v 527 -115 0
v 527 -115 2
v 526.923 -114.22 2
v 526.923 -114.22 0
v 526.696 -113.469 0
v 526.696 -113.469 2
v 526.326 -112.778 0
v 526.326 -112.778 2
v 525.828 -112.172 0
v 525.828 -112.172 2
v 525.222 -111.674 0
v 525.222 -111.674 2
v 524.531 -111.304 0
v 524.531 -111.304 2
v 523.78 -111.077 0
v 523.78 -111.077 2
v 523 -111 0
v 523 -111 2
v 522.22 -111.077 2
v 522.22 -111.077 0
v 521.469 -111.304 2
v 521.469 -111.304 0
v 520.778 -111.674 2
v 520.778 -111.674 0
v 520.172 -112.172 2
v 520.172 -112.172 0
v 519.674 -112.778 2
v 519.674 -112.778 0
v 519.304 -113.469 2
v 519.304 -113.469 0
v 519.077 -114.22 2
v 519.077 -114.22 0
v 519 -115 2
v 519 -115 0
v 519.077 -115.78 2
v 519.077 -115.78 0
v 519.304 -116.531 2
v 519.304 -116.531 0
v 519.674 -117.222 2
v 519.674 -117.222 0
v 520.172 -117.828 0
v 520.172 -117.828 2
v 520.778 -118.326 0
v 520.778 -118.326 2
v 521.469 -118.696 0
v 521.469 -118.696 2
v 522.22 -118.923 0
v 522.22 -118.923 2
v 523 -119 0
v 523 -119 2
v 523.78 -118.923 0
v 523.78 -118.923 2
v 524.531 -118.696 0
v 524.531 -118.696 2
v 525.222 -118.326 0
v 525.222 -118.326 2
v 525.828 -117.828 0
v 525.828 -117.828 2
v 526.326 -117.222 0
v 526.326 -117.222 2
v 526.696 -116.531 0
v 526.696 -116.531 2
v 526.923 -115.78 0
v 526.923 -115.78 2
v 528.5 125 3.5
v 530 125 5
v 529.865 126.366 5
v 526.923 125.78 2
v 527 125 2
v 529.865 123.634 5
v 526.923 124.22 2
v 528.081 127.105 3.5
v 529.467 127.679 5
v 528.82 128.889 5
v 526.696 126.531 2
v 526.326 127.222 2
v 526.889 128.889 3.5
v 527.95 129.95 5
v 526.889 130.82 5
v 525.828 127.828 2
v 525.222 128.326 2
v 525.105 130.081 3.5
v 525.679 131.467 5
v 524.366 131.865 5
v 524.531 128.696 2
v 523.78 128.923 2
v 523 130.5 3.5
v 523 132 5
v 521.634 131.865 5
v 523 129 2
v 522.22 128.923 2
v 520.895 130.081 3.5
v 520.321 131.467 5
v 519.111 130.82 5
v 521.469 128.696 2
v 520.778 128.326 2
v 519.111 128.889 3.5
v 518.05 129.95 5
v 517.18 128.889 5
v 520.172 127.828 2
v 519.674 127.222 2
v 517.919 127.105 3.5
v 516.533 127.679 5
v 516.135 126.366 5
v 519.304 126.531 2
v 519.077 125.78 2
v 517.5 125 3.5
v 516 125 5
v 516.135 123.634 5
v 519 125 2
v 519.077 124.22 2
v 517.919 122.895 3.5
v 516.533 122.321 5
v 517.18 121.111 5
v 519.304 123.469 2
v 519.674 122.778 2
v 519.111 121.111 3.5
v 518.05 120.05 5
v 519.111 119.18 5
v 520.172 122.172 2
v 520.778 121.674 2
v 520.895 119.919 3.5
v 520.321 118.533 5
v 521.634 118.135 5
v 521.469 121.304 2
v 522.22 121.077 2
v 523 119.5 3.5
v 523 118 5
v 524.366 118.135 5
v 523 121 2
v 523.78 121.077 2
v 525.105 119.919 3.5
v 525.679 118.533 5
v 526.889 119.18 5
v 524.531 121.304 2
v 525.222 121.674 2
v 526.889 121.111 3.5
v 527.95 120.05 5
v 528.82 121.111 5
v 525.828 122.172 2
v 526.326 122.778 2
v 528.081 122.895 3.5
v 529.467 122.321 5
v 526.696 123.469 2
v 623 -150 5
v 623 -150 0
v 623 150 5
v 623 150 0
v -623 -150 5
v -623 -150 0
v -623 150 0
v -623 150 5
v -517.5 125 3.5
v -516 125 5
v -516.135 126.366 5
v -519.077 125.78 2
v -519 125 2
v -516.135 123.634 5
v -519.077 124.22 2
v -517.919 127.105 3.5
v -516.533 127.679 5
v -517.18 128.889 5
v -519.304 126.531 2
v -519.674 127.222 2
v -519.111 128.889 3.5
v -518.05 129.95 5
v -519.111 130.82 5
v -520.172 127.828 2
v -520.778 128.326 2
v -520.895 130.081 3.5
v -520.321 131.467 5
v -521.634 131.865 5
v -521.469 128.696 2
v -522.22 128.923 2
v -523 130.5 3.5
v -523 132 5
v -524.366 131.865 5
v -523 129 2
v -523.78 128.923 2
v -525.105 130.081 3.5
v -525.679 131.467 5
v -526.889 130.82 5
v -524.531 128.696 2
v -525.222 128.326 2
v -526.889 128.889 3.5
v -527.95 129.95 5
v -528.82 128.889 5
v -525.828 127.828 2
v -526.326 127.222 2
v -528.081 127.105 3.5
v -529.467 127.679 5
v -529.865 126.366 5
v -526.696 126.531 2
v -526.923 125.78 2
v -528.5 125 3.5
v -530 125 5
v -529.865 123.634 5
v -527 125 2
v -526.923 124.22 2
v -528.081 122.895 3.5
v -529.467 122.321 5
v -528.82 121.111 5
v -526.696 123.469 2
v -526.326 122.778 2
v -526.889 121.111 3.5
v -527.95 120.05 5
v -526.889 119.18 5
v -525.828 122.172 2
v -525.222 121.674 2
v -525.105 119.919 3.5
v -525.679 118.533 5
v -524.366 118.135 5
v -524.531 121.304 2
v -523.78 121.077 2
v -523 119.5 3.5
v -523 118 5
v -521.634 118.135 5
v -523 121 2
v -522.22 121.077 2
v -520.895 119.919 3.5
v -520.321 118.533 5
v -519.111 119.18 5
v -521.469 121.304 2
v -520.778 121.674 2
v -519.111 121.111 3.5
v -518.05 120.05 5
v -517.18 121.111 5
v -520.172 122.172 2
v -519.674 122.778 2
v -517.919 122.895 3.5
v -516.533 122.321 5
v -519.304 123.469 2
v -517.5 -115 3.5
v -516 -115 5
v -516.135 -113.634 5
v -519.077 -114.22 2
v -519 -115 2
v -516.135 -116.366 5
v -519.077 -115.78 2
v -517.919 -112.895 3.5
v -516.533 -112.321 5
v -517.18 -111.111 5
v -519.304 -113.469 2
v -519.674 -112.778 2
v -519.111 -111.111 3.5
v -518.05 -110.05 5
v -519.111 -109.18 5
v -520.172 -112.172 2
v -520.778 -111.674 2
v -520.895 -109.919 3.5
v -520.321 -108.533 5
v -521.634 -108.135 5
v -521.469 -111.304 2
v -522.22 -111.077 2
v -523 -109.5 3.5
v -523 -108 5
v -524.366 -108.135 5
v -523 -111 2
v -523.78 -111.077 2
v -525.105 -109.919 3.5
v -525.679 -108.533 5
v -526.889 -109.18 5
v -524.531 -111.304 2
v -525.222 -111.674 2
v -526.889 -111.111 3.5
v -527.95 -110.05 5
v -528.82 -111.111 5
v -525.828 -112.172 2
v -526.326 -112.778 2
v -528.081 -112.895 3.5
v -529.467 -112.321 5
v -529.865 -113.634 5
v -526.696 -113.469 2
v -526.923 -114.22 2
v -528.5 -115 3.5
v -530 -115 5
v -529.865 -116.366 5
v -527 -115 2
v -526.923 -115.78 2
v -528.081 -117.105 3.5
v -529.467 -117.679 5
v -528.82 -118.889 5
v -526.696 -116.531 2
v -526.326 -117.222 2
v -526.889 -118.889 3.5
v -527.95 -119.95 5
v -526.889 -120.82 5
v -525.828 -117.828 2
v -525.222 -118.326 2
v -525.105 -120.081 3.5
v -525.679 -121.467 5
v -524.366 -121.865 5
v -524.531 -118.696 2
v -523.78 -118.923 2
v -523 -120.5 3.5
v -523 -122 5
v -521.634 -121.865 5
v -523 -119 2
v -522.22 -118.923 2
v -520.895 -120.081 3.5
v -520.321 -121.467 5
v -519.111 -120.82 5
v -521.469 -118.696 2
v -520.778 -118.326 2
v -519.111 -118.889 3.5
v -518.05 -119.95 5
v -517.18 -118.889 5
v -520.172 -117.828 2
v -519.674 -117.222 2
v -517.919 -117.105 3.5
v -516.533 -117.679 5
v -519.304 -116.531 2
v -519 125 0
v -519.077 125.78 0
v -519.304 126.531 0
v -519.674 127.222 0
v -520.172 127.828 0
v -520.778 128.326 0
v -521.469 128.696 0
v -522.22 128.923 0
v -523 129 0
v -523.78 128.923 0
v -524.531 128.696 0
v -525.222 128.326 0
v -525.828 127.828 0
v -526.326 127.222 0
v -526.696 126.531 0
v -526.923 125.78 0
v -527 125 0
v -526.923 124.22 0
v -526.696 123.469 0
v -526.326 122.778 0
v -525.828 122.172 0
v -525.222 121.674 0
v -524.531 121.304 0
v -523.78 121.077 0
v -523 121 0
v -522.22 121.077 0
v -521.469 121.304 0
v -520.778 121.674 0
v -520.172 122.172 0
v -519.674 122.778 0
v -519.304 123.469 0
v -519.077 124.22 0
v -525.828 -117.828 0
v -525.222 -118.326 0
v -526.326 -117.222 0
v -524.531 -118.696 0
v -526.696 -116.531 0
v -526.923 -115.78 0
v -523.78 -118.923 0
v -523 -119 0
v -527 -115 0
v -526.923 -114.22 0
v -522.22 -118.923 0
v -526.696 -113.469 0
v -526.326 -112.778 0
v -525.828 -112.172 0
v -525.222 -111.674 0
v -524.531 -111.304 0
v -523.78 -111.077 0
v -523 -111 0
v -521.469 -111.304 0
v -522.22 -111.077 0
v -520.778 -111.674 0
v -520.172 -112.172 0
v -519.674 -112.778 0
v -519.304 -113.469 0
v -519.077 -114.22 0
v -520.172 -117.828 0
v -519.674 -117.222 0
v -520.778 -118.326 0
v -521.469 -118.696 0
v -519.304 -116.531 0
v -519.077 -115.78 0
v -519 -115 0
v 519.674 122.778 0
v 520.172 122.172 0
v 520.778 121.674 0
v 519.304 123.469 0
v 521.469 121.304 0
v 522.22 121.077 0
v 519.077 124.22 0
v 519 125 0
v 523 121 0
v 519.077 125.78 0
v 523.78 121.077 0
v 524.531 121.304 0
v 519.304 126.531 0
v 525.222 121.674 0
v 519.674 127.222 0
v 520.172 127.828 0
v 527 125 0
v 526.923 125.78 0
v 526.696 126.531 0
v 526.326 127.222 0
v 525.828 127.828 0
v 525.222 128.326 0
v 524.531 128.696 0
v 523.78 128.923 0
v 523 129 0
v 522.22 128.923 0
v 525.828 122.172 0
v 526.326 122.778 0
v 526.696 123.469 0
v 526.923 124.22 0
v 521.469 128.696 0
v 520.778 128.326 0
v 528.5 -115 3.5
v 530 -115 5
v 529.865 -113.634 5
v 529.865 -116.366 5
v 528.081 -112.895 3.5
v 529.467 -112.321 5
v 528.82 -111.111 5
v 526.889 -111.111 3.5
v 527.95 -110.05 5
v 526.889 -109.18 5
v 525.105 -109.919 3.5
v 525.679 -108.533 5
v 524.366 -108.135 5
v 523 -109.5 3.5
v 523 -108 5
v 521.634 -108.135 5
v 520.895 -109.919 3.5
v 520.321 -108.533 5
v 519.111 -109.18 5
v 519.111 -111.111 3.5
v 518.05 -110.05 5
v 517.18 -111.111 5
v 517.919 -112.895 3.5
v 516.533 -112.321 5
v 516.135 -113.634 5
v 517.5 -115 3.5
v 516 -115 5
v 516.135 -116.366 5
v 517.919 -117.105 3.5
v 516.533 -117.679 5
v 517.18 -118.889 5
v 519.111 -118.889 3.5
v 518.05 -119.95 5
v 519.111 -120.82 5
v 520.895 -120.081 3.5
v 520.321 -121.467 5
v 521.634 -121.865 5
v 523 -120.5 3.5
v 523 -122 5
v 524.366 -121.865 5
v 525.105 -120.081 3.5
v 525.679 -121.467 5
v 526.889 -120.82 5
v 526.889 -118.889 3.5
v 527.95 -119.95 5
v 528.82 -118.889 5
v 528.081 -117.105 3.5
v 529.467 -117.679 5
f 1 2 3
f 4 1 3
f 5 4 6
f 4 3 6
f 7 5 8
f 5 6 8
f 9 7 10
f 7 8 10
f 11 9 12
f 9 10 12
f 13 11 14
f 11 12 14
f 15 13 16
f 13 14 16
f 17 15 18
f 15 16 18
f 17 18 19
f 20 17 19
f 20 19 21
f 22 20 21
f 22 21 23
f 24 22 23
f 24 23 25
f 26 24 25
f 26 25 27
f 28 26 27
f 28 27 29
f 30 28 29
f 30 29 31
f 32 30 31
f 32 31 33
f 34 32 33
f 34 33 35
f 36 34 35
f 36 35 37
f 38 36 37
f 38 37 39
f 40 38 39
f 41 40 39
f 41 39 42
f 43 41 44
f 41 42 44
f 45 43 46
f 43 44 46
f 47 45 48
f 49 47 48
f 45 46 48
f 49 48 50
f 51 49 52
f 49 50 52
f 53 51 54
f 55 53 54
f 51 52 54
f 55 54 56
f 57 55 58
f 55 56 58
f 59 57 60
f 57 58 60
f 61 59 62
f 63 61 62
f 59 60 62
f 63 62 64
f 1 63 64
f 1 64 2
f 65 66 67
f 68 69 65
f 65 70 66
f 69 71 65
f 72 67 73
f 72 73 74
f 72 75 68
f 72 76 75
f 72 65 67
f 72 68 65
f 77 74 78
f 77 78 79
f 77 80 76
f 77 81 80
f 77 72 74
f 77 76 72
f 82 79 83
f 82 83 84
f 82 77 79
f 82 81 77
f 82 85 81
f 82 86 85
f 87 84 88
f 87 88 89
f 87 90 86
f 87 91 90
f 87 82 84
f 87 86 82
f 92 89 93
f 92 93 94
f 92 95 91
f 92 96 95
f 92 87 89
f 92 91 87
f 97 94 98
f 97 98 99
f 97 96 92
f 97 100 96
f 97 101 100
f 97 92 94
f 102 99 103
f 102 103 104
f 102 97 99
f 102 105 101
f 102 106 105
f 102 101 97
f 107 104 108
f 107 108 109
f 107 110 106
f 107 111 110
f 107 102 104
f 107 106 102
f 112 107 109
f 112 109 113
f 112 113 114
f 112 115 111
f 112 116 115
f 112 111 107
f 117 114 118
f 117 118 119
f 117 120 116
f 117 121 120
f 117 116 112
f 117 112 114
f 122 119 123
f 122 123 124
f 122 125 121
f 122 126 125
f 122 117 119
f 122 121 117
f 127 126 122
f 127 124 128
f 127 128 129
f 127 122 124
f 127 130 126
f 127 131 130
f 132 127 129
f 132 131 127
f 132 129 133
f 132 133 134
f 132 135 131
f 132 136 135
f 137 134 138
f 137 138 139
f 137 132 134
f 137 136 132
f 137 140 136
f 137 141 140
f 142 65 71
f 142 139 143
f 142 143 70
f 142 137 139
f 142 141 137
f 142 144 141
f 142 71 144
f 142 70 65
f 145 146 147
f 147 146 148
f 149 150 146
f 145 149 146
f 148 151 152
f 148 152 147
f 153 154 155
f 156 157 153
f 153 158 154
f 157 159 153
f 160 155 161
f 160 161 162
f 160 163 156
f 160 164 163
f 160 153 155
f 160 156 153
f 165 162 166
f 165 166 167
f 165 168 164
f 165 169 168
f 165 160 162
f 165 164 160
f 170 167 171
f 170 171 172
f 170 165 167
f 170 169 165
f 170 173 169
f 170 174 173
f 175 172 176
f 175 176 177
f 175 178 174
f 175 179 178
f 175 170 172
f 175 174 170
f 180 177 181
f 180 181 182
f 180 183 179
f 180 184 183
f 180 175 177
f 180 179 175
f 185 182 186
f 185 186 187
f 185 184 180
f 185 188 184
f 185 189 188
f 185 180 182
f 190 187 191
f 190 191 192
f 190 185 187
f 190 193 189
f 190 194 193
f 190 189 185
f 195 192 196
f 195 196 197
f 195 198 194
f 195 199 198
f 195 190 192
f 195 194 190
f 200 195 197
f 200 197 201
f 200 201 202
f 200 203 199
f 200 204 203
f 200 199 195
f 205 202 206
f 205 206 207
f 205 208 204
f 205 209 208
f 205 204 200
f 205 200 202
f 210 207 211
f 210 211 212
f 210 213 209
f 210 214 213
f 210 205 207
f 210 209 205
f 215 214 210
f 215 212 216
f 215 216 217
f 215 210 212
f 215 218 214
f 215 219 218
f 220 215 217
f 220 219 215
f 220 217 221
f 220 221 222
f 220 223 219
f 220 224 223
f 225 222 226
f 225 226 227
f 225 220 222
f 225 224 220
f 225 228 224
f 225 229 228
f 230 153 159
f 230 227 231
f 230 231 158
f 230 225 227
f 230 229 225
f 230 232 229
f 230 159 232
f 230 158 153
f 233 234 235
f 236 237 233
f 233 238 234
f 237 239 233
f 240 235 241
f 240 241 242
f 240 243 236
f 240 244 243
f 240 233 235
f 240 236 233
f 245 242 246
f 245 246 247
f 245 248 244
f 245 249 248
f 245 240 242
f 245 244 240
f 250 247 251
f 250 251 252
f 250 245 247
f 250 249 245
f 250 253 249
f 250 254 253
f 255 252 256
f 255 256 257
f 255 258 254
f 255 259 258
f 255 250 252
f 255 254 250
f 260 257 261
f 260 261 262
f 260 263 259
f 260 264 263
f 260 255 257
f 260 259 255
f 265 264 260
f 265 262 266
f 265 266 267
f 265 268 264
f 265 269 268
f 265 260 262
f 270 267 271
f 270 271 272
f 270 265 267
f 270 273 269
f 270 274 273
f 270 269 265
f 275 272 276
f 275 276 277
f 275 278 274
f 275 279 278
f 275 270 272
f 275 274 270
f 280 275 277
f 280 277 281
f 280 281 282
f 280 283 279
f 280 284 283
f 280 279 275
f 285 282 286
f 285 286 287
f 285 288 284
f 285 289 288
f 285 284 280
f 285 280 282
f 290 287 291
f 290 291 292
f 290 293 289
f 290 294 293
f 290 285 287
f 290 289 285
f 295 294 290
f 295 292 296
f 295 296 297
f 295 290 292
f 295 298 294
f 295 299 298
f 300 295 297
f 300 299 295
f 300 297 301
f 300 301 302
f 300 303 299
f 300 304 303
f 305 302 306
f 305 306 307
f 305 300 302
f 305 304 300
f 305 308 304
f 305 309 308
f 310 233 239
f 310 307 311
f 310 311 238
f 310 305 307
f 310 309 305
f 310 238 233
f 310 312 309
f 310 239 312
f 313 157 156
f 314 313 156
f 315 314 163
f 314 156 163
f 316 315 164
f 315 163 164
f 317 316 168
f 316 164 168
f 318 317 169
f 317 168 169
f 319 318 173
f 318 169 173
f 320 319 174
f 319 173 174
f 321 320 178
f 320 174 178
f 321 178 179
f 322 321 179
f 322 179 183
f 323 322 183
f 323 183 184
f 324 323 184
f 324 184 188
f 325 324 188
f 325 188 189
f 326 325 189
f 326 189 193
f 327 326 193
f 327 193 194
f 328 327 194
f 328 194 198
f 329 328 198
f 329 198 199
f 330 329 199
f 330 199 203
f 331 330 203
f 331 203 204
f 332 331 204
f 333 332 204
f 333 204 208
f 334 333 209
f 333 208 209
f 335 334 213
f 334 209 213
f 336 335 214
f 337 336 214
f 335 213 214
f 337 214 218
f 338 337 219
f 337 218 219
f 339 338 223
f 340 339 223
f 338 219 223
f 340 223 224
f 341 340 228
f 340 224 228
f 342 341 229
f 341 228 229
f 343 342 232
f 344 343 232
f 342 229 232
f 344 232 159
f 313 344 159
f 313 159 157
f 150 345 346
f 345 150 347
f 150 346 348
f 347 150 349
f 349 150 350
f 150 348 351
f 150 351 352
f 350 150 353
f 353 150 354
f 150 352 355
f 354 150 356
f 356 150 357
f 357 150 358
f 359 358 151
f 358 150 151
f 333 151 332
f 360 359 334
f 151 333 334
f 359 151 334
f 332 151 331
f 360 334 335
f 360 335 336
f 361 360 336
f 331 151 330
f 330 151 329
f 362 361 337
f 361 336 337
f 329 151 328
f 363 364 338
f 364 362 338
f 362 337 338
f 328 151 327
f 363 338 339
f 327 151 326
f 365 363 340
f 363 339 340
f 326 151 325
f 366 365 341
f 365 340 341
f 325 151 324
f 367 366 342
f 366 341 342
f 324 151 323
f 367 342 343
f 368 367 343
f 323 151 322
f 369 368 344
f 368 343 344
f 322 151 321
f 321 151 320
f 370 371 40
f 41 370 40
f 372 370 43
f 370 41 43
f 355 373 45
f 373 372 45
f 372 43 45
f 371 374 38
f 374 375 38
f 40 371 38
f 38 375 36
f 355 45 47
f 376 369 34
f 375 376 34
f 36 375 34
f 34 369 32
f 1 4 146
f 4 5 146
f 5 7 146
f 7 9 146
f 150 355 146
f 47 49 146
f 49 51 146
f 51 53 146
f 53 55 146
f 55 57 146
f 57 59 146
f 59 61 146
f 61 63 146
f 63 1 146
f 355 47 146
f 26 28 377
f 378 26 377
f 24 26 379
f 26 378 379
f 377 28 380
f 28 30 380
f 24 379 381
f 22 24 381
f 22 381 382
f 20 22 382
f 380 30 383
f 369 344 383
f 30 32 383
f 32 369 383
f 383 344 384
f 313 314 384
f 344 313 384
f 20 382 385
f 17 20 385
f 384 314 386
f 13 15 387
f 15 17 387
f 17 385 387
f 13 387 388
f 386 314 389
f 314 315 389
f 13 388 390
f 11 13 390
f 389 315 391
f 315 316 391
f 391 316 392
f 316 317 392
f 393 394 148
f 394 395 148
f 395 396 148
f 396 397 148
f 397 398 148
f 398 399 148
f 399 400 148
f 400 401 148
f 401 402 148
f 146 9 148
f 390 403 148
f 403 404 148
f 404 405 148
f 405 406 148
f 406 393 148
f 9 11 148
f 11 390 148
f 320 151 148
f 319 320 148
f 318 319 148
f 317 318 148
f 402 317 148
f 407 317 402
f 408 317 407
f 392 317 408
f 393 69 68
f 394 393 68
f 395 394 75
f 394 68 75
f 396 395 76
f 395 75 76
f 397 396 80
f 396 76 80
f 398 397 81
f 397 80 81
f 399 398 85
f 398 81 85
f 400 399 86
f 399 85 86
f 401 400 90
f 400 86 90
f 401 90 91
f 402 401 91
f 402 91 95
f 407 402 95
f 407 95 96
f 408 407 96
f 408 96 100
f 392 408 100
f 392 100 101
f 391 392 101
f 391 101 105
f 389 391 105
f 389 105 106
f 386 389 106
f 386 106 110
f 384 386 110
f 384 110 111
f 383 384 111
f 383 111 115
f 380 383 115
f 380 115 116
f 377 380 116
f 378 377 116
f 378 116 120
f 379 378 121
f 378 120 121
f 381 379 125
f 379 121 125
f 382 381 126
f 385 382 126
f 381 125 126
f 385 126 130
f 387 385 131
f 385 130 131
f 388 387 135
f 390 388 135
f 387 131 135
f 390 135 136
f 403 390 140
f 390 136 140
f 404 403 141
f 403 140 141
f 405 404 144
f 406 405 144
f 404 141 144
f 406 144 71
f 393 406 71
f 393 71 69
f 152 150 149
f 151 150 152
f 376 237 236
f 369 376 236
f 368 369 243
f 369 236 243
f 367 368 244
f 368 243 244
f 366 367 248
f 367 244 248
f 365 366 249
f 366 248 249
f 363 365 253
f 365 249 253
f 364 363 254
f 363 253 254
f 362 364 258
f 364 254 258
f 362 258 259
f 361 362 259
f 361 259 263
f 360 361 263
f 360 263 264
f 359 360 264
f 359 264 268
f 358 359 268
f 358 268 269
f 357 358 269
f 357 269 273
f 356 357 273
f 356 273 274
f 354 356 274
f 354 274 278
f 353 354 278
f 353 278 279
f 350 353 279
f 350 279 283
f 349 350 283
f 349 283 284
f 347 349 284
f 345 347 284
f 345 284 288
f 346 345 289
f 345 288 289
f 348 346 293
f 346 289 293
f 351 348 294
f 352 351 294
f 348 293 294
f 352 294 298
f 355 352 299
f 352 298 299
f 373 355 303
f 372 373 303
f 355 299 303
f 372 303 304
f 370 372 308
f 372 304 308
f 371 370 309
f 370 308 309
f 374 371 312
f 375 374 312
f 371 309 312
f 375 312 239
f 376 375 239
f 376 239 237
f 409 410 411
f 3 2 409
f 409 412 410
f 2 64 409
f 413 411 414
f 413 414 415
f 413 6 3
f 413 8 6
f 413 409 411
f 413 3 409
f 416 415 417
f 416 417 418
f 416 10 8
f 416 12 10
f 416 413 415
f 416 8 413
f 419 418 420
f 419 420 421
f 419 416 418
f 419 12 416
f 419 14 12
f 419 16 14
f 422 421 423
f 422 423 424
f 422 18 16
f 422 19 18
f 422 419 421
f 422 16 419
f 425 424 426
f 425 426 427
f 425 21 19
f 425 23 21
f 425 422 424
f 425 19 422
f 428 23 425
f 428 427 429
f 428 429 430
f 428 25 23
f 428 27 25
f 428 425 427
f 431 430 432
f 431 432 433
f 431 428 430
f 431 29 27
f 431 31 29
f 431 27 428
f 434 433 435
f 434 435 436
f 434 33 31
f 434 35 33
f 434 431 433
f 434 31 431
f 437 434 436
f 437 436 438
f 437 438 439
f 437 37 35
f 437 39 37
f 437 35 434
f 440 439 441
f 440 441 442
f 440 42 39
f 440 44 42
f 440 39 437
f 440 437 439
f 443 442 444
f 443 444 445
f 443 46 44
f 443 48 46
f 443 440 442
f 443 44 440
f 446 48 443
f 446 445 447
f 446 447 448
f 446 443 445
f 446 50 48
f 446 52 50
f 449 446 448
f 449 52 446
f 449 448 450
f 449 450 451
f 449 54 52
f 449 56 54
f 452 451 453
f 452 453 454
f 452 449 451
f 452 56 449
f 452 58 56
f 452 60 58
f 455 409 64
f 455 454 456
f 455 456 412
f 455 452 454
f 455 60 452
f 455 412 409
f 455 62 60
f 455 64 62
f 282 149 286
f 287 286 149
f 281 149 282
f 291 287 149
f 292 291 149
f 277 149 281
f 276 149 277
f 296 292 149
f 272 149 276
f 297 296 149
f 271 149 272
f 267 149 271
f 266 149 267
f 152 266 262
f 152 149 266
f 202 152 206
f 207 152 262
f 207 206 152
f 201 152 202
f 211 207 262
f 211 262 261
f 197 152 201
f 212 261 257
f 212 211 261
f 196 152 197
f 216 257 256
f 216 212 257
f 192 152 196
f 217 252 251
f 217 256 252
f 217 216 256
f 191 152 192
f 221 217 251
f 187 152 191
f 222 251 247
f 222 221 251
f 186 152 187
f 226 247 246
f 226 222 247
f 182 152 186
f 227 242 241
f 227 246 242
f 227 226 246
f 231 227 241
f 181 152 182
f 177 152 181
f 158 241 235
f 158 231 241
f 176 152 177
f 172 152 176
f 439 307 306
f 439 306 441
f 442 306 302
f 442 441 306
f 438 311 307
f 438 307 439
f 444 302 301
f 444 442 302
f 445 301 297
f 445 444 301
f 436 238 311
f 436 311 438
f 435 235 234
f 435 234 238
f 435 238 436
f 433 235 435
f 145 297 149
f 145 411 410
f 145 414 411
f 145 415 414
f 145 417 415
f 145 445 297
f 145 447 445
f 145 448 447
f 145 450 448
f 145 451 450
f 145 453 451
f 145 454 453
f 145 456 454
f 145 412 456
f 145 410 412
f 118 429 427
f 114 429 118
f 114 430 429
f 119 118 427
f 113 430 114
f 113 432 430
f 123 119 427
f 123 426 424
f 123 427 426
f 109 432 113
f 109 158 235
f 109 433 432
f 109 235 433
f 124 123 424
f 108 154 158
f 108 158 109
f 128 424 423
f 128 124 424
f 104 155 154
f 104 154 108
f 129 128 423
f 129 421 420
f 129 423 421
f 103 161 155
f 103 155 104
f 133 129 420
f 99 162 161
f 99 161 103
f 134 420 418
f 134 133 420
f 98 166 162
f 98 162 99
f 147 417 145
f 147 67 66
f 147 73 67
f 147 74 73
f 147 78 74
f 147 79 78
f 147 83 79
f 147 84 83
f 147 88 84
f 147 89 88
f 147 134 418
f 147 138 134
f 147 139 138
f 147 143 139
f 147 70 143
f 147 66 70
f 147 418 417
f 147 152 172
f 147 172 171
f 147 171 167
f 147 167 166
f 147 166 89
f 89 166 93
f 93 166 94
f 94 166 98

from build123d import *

# Parameters (mm, degrees)
SKETCH1_W           = 1246
SKETCH1_H           = 300
BOSS_EXTRUDE1_DEPTH = 5
SKETCH2_R           = 4
CUT_EXTRUDE1_DEPTH  = 6
CHAMFER1_SIZE       = 3


with BuildPart() as part:
    # Sketch1 → Boss-Extrude1 (new body)
    with BuildSketch(Plane.XY):
        Rectangle(SKETCH1_W, SKETCH1_H)
    extrude(amount=BOSS_EXTRUDE1_DEPTH)

    # Sketch2 → Cut-Extrude1 (cut, through all)
    with BuildSketch(Plane.XY.offset(5)):
        with Locations((-523, 125)):
            Circle(SKETCH2_R)
        with Locations((523, 125)):
            Circle(SKETCH2_R)
        with Locations((523, -115)):
            Circle(SKETCH2_R)
        with Locations((-523, -115)):
            Circle(SKETCH2_R)
    extrude(amount=-CUT_EXTRUDE1_DEPTH, mode=Mode.SUBTRACT)

    # Chamfer1
    chamfer1_edges = [part.edges().sort_by_distance(p)[0] for p in [
        (-527, 125, 5),
        (519, 125, 5),
        (519, -115, 5),
        (-527, -115, 5),
    ]]
    chamfer(chamfer1_edges, length=CHAMFER1_SIZE)


solid = part.part
